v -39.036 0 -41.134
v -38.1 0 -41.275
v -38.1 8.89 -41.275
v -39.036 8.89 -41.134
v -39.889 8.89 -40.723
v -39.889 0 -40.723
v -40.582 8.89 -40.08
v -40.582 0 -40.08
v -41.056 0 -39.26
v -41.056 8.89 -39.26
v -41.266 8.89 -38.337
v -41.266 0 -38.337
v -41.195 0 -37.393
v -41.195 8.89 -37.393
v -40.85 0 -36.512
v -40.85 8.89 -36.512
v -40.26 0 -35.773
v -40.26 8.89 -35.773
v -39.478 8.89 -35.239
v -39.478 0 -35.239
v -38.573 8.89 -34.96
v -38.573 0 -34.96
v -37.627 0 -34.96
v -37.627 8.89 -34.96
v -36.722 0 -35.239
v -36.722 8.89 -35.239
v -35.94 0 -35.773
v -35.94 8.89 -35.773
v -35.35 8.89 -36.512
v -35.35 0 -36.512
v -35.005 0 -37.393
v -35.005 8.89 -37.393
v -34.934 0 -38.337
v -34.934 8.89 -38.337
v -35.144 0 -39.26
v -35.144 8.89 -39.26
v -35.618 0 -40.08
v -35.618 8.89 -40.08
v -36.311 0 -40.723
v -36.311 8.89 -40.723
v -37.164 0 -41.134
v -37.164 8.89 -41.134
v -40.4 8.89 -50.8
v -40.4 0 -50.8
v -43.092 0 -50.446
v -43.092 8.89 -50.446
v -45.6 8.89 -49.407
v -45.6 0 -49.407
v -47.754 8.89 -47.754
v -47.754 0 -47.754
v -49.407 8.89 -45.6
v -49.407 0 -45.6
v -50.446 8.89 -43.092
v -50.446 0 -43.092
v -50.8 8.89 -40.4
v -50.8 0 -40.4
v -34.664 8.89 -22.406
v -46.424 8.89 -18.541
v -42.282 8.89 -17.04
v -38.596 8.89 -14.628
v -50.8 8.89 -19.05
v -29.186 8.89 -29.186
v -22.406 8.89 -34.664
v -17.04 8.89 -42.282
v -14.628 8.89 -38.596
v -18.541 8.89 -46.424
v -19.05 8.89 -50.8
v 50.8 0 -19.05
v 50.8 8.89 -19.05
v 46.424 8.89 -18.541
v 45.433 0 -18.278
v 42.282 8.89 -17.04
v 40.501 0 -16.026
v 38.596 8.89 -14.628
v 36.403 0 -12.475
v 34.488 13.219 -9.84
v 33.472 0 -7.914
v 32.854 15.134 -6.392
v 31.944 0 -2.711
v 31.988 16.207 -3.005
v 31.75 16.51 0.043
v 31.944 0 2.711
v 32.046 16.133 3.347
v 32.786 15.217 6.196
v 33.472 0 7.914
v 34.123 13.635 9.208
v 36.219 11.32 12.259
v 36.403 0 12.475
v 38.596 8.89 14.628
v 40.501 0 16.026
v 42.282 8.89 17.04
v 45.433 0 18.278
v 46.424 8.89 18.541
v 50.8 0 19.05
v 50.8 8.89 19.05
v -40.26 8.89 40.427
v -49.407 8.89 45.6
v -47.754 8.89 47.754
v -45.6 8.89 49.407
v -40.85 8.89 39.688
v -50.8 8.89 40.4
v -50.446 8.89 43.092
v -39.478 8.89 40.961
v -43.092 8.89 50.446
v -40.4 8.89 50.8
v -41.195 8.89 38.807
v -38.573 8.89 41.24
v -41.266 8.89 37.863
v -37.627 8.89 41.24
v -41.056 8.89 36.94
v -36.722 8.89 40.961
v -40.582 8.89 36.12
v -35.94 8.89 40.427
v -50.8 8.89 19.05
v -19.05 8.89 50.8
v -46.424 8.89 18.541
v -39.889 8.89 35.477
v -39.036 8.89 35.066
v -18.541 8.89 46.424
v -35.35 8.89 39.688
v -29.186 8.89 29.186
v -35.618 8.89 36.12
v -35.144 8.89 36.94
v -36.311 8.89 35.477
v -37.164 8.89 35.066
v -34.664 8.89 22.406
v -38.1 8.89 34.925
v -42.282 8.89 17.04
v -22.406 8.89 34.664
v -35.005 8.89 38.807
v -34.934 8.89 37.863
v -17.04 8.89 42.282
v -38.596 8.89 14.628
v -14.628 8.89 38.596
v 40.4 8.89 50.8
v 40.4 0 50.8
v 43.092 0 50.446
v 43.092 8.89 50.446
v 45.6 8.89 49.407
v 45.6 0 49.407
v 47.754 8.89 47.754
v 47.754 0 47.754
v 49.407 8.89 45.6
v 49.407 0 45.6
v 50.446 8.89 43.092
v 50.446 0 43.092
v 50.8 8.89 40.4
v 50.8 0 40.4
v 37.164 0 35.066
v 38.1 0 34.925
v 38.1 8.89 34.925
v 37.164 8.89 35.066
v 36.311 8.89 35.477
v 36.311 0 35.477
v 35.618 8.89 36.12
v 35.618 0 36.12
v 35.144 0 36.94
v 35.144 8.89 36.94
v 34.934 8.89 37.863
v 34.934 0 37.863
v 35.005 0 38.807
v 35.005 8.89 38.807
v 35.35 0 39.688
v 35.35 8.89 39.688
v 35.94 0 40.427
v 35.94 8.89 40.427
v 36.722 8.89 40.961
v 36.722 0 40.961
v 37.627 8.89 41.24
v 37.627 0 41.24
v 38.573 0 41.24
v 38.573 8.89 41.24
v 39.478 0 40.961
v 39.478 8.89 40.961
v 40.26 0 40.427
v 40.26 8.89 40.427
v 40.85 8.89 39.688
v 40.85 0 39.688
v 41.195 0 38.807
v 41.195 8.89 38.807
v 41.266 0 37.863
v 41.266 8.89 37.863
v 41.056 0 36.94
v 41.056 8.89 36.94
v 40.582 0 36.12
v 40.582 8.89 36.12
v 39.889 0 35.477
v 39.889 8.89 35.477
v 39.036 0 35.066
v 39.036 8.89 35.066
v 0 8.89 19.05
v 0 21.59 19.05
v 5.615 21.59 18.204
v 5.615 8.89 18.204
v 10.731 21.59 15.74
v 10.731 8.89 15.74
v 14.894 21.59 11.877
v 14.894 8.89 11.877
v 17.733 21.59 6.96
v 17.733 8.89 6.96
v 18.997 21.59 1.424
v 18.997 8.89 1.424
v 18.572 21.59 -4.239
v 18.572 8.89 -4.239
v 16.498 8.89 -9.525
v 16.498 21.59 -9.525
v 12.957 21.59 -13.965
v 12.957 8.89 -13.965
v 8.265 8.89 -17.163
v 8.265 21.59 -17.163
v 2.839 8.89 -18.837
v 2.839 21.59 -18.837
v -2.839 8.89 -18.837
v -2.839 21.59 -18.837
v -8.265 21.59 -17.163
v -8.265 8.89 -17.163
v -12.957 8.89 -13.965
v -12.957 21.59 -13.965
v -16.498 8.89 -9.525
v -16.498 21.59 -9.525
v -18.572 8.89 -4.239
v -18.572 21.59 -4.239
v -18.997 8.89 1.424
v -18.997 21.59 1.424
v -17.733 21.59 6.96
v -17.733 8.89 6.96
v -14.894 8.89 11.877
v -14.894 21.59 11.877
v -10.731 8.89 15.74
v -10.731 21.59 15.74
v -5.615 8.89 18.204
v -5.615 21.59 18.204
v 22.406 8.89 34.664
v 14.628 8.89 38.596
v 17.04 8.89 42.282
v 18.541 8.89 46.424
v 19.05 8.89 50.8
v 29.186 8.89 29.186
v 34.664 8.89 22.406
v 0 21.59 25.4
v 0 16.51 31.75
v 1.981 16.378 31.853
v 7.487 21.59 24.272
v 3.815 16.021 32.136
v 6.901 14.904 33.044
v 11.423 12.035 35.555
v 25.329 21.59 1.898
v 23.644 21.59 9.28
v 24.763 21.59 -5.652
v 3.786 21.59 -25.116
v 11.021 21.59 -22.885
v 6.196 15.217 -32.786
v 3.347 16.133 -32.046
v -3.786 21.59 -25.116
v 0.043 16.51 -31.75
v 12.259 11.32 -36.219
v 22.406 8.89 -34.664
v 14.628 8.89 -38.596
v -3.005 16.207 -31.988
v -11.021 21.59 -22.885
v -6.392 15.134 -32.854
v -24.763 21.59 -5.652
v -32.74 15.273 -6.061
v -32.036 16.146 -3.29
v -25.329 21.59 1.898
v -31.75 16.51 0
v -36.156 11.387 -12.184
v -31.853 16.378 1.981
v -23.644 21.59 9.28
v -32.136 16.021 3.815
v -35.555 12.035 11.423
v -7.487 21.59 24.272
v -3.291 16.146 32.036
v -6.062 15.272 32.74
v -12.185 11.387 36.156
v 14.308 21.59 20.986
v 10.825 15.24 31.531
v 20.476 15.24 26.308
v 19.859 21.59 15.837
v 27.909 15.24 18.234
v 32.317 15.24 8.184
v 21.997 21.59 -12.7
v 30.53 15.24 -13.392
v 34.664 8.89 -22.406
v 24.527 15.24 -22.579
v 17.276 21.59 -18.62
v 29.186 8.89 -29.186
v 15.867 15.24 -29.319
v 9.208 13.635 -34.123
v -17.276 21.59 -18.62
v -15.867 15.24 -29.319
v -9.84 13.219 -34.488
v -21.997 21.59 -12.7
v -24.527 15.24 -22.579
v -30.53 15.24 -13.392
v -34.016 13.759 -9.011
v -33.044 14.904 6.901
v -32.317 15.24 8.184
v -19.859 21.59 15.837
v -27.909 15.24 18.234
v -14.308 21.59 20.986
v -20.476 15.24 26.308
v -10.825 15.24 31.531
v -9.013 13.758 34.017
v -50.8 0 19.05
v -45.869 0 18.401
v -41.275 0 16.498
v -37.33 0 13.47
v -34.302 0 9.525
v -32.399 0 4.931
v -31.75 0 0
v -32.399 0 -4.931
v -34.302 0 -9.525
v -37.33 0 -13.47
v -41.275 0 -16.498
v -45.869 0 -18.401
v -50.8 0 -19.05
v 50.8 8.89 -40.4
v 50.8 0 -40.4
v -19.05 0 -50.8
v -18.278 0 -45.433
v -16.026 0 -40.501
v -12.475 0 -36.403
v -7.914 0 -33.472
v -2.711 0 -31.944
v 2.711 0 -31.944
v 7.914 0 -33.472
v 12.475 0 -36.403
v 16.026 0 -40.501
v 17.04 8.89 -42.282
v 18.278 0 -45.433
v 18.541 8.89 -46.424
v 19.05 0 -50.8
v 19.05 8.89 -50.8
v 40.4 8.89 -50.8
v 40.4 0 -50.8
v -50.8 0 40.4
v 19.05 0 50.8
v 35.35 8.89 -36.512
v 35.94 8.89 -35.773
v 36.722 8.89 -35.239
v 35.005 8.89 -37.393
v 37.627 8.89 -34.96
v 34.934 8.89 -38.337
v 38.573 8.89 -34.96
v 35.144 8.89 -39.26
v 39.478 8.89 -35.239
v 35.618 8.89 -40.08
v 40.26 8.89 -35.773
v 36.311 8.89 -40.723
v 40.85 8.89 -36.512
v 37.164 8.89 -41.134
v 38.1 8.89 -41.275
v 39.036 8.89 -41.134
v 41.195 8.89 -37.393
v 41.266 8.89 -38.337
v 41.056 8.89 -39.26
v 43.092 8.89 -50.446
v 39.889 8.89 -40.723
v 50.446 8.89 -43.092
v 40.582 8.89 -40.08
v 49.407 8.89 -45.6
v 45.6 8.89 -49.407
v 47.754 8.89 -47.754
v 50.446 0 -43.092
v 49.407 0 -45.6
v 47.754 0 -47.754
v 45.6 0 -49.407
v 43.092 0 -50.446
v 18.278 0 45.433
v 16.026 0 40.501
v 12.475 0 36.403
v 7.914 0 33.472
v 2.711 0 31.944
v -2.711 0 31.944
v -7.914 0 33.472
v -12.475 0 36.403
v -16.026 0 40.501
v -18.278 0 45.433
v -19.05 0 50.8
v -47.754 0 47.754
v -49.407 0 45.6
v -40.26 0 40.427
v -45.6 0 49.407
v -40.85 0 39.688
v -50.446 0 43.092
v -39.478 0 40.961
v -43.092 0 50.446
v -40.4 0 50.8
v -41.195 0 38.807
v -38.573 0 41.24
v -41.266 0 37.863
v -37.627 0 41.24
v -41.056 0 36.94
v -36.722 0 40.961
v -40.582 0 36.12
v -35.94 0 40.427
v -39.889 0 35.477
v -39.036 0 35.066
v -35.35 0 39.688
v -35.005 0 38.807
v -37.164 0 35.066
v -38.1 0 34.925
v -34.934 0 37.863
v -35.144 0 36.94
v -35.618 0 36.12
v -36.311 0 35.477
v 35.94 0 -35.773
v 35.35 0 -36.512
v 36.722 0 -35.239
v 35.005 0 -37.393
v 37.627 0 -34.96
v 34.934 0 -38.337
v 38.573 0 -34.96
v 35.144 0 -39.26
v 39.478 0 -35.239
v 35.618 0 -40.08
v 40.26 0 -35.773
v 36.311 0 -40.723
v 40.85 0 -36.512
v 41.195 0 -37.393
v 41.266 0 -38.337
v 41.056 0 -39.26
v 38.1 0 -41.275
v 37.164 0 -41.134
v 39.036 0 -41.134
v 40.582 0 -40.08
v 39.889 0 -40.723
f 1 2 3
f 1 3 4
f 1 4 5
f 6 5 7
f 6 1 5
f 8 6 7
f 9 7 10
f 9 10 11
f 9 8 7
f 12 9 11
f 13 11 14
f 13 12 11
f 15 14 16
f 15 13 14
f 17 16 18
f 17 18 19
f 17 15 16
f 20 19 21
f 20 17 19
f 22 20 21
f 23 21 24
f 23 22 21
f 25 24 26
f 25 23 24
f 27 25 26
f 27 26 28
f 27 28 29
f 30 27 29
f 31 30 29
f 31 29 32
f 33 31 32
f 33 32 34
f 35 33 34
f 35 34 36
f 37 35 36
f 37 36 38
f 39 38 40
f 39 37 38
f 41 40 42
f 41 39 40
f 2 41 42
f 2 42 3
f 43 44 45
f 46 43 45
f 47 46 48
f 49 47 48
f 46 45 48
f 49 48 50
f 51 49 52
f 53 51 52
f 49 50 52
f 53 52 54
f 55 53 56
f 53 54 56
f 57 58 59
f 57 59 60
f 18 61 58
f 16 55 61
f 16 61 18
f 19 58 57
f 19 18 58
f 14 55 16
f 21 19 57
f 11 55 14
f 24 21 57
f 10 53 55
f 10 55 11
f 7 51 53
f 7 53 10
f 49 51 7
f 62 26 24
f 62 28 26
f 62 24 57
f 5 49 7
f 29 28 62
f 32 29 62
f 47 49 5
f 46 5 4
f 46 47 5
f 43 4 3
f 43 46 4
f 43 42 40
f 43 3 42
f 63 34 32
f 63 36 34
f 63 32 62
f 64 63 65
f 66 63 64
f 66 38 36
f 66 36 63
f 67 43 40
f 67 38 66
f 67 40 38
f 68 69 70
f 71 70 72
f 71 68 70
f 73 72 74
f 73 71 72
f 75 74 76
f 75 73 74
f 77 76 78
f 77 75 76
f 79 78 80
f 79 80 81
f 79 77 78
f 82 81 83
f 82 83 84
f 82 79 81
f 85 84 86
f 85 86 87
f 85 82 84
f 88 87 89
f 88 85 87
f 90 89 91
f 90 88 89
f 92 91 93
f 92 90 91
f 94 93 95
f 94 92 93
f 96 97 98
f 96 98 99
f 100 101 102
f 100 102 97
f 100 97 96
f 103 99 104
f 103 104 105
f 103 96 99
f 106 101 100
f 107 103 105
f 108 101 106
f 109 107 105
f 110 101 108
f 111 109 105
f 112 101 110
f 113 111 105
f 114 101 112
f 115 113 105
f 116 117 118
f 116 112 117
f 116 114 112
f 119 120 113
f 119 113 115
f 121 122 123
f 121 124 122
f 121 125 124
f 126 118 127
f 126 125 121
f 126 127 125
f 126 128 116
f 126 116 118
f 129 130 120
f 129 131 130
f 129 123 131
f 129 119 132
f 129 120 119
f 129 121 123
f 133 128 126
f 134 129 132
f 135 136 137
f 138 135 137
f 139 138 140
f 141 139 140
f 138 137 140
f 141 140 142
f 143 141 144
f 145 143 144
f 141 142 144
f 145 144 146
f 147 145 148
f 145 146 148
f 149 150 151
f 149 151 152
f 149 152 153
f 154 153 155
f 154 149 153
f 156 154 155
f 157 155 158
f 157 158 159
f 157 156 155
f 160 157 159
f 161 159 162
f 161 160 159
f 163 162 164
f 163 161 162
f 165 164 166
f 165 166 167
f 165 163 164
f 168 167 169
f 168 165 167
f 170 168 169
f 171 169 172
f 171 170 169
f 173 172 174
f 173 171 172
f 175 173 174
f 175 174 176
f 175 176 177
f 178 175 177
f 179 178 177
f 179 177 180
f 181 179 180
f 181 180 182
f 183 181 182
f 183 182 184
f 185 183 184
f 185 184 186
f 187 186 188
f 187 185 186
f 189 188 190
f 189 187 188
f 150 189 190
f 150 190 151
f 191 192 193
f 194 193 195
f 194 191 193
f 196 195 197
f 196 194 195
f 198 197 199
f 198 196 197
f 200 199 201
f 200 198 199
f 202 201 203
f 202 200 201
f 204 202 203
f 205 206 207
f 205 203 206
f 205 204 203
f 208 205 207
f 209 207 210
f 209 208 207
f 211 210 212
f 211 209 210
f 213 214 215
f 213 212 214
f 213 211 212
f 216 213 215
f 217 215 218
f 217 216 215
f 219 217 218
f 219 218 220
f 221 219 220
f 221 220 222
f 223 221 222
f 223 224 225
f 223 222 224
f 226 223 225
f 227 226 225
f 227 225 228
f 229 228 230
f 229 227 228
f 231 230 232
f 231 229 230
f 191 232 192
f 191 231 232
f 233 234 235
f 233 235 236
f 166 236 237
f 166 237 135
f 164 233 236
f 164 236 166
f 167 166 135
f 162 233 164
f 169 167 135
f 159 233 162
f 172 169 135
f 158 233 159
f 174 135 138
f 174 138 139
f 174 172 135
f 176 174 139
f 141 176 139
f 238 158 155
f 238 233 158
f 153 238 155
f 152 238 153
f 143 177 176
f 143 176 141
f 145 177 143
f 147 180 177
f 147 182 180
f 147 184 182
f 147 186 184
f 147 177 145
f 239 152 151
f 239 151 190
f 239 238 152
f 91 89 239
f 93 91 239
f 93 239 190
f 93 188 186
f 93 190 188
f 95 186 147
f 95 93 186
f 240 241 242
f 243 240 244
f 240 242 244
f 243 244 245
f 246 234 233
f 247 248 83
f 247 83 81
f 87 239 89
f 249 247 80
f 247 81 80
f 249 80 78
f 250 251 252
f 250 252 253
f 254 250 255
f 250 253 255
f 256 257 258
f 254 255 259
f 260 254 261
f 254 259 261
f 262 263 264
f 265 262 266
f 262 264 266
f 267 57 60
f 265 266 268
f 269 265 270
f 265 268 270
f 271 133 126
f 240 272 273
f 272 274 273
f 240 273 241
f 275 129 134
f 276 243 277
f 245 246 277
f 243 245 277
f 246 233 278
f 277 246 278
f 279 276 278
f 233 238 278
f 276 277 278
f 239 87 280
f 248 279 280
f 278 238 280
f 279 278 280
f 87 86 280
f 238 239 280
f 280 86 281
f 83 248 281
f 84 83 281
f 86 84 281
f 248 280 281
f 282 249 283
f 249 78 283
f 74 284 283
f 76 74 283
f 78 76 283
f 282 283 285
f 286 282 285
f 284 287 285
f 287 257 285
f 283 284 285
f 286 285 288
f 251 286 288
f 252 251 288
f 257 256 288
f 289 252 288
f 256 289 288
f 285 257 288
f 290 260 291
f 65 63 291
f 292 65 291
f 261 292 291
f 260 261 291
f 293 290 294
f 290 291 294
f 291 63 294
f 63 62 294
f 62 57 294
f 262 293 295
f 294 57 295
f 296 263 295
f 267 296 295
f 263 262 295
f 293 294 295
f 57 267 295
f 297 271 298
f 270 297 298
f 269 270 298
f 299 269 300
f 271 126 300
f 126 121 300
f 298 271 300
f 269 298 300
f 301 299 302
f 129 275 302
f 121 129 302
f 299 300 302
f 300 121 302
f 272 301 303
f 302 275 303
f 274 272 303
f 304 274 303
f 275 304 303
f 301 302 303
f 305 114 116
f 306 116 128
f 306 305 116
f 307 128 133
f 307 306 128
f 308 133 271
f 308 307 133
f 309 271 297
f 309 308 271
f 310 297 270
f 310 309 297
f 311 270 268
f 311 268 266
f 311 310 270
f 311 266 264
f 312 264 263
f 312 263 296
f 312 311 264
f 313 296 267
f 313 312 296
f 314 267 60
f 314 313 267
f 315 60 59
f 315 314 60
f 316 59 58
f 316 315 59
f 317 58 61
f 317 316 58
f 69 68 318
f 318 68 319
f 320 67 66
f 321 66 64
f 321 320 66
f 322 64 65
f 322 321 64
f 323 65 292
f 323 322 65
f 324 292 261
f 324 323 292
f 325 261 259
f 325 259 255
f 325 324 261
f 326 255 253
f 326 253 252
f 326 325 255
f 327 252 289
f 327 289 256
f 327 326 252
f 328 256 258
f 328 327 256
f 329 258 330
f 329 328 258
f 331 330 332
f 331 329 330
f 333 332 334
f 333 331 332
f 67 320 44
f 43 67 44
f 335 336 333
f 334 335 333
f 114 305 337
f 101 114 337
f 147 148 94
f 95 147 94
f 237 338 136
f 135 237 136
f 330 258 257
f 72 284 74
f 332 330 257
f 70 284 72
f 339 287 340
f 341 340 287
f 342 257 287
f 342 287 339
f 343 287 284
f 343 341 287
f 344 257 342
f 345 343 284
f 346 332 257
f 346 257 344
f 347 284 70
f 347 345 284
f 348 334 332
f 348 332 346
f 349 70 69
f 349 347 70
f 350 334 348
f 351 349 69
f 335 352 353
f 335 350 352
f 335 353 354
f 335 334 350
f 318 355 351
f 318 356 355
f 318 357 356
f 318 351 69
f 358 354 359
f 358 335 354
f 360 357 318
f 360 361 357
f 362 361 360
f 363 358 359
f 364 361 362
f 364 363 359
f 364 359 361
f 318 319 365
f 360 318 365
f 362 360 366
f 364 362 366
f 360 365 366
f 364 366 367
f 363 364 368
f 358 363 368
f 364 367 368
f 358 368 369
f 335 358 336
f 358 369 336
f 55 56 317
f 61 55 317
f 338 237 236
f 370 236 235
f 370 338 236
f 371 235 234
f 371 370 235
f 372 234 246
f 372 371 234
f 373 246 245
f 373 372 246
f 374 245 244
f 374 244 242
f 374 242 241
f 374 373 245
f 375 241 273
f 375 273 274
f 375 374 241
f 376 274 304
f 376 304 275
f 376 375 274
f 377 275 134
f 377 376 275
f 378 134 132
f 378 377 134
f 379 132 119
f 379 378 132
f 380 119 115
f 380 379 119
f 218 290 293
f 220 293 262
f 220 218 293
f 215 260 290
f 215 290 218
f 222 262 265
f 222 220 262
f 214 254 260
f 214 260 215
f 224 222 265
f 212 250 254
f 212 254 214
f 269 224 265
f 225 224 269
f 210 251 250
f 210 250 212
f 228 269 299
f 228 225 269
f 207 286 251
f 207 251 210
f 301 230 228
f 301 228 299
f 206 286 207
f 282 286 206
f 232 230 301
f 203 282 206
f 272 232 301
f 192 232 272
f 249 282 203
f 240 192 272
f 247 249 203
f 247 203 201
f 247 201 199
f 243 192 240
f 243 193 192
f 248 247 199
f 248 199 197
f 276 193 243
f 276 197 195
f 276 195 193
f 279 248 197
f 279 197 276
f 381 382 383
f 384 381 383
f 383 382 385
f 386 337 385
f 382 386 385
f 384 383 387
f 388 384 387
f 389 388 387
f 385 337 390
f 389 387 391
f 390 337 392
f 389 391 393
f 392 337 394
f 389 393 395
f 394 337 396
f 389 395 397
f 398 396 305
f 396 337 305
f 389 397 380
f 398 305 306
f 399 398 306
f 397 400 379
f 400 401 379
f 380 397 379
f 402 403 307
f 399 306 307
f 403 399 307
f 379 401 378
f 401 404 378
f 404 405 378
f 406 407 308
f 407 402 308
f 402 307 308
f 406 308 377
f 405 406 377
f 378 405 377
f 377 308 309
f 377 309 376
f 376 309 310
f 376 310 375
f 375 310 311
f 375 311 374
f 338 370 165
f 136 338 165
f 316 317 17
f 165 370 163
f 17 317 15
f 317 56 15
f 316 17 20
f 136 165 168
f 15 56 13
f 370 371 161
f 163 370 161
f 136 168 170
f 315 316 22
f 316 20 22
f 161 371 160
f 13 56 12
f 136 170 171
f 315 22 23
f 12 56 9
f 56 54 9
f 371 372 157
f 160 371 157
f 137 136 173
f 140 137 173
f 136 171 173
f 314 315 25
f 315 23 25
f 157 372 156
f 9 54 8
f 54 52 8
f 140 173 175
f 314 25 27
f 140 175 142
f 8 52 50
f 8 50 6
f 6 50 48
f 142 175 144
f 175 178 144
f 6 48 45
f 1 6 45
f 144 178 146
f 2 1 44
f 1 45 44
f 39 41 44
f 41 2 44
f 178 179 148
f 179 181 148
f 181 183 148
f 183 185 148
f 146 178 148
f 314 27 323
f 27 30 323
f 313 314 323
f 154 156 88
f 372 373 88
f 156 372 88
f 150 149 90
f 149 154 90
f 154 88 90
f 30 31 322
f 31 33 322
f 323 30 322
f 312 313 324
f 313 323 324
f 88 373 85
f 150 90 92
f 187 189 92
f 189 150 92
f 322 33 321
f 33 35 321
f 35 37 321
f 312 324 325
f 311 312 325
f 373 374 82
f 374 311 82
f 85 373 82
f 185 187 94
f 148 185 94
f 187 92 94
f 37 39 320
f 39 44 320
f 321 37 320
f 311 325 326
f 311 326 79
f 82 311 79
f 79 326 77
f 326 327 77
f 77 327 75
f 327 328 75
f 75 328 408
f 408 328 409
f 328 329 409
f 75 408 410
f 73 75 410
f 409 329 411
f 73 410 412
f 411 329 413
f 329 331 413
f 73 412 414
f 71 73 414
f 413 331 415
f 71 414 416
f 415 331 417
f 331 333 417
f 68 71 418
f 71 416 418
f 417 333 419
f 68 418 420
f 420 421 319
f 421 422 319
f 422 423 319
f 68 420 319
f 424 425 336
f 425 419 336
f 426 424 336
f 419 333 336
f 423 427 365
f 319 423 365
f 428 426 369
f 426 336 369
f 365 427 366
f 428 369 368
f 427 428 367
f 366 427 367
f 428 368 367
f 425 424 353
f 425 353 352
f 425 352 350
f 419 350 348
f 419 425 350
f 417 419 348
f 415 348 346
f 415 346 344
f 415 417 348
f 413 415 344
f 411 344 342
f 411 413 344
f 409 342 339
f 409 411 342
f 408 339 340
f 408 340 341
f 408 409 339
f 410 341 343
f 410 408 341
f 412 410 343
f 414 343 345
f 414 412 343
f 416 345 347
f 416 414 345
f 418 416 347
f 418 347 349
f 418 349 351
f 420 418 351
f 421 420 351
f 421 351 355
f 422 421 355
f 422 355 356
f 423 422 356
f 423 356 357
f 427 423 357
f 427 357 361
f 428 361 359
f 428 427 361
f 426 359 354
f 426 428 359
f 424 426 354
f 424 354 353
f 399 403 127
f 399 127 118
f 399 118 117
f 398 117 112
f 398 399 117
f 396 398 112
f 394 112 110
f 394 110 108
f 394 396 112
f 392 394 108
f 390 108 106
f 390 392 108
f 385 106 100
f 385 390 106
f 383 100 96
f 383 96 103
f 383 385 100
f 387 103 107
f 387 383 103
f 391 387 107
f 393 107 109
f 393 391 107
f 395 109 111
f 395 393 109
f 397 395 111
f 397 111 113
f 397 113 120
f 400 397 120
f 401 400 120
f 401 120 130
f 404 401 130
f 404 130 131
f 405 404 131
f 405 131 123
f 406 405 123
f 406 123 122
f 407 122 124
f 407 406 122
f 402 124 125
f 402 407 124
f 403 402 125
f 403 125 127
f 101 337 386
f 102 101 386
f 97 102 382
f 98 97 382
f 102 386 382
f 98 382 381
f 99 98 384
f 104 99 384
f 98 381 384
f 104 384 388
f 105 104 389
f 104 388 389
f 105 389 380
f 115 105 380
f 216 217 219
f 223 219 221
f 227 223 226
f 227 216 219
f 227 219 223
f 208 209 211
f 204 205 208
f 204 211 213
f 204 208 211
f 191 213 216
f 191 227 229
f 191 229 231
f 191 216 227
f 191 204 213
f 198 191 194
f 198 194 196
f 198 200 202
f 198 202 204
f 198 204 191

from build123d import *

# Parameters (mm, degrees)
SKETCH2_R           = 3.175
BOSS_EXTRUDE2_DEPTH = 8.89
SKETCH4_R           = 25.4
SKETCH4_R_2         = 19.05
BOSS_EXTRUDE3_DEPTH = 12.7
SKETCH4_3_R         = 41.275
SKETCH4_4_R         = 19.05
CUT_EXTRUDE1_DEPTH  = 73.955945628
CUT_EXTRUDE2_DEPTH  = 76.016052311


with BuildPart() as part:
    # Sketch2 → Boss-Extrude2 (new body)
    with BuildSketch(Plane(origin=(0, 0, 0), x_dir=(1, 0, 0), z_dir=(0, 1, 0))):
        with BuildLine():
            Line((-40.4, -50.8), (40.4, -50.8))
            ThreePointArc((40.4, -50.8), (47.753910524, -47.753910524), (50.8, -40.4))
            Line((50.8, -40.4), (50.8, 40.4))
            ThreePointArc((50.8, 40.4), (47.753910524, 47.753910524), (40.4, 50.8))
            Line((40.4, 50.8), (-40.4, 50.8))
            ThreePointArc((-40.4, 50.8), (-47.753910524, 47.753910524), (-50.8, 40.4))
            Line((-50.8, 40.4), (-50.8, -40.4))
            ThreePointArc((-50.8, -40.4), (-47.753910524, -47.753910524), (-40.4, -50.8))
        make_face()
        with Locations((-38.1, -38.1)):
            Circle(SKETCH2_R, mode=Mode.SUBTRACT)
        with Locations((38.1, -38.1)):
            Circle(SKETCH2_R, mode=Mode.SUBTRACT)
        with Locations((-38.1, 38.1)):
            Circle(SKETCH2_R, mode=Mode.SUBTRACT)
        with Locations((38.1, 38.1)):
            Circle(SKETCH2_R, mode=Mode.SUBTRACT)
    extrude(amount=BOSS_EXTRUDE2_DEPTH)

    # Sketch4 → Boss-Extrude3 (add)
    with BuildSketch(Plane(origin=(0, 8.89, 0), x_dir=(1, 0, 0), z_dir=(0, 1, 0))):
        Circle(SKETCH4_R)
        Circle(SKETCH4_R_2, mode=Mode.SUBTRACT)
    extrude(amount=BOSS_EXTRUDE3_DEPTH)

    # Sketch4<3> → section 1 of loft1
    with BuildSketch(Plane(origin=(0, 8.89, 0), x_dir=(1, 0, 0), z_dir=(0, 1, 0)), mode=Mode.PRIVATE) as loft1_s1:
        Circle(SKETCH4_3_R)
    # loft up to a face of the part (loft1)
    loft([Face(Wire([part.edges().sort_by_distance((-17.387496491, 21.59, -18.515803137))[0]])), loft1_s1.sketch])

    # Sketch4<4> → Cut-Extrude1 (cut, through all)
    with BuildSketch(Plane(origin=(0, 8.89, 0), x_dir=(1, 0, 0), z_dir=(0, 1, 0))):
        Circle(SKETCH4_4_R)
    extrude(amount=CUT_EXTRUDE1_DEPTH, mode=Mode.SUBTRACT)

    # Sketch2<3> → Cut-Extrude2 (cut, through all)
    with BuildSketch(Plane(origin=(0, 0, 0), x_dir=(1, 0, 0), z_dir=(0, 1, 0))):
        with BuildLine():
            Line((-19.05, -50.8), (19.05, -50.8))
            ThreePointArc((19.05, -50.8), (0, -31.75), (-19.05, -50.8))
        make_face()
        with BuildLine():
            ThreePointArc((50.8, 19.05), (31.75, 0), (50.8, -19.05))
            Line((50.8, -19.05), (50.8, 19.05))
        make_face()
        with BuildLine():
            Line((-50.8, 19.05), (-50.8, -19.05))
            ThreePointArc((-50.8, -19.05), (-31.75, 0), (-50.8, 19.05))
        make_face()
        with BuildLine():
            ThreePointArc((-19.05, 50.8), (0, 31.75), (19.05, 50.8))
            Line((19.05, 50.8), (-19.05, 50.8))
        make_face()
    extrude(amount=CUT_EXTRUDE2_DEPTH, mode=Mode.SUBTRACT)


solid = part.part
